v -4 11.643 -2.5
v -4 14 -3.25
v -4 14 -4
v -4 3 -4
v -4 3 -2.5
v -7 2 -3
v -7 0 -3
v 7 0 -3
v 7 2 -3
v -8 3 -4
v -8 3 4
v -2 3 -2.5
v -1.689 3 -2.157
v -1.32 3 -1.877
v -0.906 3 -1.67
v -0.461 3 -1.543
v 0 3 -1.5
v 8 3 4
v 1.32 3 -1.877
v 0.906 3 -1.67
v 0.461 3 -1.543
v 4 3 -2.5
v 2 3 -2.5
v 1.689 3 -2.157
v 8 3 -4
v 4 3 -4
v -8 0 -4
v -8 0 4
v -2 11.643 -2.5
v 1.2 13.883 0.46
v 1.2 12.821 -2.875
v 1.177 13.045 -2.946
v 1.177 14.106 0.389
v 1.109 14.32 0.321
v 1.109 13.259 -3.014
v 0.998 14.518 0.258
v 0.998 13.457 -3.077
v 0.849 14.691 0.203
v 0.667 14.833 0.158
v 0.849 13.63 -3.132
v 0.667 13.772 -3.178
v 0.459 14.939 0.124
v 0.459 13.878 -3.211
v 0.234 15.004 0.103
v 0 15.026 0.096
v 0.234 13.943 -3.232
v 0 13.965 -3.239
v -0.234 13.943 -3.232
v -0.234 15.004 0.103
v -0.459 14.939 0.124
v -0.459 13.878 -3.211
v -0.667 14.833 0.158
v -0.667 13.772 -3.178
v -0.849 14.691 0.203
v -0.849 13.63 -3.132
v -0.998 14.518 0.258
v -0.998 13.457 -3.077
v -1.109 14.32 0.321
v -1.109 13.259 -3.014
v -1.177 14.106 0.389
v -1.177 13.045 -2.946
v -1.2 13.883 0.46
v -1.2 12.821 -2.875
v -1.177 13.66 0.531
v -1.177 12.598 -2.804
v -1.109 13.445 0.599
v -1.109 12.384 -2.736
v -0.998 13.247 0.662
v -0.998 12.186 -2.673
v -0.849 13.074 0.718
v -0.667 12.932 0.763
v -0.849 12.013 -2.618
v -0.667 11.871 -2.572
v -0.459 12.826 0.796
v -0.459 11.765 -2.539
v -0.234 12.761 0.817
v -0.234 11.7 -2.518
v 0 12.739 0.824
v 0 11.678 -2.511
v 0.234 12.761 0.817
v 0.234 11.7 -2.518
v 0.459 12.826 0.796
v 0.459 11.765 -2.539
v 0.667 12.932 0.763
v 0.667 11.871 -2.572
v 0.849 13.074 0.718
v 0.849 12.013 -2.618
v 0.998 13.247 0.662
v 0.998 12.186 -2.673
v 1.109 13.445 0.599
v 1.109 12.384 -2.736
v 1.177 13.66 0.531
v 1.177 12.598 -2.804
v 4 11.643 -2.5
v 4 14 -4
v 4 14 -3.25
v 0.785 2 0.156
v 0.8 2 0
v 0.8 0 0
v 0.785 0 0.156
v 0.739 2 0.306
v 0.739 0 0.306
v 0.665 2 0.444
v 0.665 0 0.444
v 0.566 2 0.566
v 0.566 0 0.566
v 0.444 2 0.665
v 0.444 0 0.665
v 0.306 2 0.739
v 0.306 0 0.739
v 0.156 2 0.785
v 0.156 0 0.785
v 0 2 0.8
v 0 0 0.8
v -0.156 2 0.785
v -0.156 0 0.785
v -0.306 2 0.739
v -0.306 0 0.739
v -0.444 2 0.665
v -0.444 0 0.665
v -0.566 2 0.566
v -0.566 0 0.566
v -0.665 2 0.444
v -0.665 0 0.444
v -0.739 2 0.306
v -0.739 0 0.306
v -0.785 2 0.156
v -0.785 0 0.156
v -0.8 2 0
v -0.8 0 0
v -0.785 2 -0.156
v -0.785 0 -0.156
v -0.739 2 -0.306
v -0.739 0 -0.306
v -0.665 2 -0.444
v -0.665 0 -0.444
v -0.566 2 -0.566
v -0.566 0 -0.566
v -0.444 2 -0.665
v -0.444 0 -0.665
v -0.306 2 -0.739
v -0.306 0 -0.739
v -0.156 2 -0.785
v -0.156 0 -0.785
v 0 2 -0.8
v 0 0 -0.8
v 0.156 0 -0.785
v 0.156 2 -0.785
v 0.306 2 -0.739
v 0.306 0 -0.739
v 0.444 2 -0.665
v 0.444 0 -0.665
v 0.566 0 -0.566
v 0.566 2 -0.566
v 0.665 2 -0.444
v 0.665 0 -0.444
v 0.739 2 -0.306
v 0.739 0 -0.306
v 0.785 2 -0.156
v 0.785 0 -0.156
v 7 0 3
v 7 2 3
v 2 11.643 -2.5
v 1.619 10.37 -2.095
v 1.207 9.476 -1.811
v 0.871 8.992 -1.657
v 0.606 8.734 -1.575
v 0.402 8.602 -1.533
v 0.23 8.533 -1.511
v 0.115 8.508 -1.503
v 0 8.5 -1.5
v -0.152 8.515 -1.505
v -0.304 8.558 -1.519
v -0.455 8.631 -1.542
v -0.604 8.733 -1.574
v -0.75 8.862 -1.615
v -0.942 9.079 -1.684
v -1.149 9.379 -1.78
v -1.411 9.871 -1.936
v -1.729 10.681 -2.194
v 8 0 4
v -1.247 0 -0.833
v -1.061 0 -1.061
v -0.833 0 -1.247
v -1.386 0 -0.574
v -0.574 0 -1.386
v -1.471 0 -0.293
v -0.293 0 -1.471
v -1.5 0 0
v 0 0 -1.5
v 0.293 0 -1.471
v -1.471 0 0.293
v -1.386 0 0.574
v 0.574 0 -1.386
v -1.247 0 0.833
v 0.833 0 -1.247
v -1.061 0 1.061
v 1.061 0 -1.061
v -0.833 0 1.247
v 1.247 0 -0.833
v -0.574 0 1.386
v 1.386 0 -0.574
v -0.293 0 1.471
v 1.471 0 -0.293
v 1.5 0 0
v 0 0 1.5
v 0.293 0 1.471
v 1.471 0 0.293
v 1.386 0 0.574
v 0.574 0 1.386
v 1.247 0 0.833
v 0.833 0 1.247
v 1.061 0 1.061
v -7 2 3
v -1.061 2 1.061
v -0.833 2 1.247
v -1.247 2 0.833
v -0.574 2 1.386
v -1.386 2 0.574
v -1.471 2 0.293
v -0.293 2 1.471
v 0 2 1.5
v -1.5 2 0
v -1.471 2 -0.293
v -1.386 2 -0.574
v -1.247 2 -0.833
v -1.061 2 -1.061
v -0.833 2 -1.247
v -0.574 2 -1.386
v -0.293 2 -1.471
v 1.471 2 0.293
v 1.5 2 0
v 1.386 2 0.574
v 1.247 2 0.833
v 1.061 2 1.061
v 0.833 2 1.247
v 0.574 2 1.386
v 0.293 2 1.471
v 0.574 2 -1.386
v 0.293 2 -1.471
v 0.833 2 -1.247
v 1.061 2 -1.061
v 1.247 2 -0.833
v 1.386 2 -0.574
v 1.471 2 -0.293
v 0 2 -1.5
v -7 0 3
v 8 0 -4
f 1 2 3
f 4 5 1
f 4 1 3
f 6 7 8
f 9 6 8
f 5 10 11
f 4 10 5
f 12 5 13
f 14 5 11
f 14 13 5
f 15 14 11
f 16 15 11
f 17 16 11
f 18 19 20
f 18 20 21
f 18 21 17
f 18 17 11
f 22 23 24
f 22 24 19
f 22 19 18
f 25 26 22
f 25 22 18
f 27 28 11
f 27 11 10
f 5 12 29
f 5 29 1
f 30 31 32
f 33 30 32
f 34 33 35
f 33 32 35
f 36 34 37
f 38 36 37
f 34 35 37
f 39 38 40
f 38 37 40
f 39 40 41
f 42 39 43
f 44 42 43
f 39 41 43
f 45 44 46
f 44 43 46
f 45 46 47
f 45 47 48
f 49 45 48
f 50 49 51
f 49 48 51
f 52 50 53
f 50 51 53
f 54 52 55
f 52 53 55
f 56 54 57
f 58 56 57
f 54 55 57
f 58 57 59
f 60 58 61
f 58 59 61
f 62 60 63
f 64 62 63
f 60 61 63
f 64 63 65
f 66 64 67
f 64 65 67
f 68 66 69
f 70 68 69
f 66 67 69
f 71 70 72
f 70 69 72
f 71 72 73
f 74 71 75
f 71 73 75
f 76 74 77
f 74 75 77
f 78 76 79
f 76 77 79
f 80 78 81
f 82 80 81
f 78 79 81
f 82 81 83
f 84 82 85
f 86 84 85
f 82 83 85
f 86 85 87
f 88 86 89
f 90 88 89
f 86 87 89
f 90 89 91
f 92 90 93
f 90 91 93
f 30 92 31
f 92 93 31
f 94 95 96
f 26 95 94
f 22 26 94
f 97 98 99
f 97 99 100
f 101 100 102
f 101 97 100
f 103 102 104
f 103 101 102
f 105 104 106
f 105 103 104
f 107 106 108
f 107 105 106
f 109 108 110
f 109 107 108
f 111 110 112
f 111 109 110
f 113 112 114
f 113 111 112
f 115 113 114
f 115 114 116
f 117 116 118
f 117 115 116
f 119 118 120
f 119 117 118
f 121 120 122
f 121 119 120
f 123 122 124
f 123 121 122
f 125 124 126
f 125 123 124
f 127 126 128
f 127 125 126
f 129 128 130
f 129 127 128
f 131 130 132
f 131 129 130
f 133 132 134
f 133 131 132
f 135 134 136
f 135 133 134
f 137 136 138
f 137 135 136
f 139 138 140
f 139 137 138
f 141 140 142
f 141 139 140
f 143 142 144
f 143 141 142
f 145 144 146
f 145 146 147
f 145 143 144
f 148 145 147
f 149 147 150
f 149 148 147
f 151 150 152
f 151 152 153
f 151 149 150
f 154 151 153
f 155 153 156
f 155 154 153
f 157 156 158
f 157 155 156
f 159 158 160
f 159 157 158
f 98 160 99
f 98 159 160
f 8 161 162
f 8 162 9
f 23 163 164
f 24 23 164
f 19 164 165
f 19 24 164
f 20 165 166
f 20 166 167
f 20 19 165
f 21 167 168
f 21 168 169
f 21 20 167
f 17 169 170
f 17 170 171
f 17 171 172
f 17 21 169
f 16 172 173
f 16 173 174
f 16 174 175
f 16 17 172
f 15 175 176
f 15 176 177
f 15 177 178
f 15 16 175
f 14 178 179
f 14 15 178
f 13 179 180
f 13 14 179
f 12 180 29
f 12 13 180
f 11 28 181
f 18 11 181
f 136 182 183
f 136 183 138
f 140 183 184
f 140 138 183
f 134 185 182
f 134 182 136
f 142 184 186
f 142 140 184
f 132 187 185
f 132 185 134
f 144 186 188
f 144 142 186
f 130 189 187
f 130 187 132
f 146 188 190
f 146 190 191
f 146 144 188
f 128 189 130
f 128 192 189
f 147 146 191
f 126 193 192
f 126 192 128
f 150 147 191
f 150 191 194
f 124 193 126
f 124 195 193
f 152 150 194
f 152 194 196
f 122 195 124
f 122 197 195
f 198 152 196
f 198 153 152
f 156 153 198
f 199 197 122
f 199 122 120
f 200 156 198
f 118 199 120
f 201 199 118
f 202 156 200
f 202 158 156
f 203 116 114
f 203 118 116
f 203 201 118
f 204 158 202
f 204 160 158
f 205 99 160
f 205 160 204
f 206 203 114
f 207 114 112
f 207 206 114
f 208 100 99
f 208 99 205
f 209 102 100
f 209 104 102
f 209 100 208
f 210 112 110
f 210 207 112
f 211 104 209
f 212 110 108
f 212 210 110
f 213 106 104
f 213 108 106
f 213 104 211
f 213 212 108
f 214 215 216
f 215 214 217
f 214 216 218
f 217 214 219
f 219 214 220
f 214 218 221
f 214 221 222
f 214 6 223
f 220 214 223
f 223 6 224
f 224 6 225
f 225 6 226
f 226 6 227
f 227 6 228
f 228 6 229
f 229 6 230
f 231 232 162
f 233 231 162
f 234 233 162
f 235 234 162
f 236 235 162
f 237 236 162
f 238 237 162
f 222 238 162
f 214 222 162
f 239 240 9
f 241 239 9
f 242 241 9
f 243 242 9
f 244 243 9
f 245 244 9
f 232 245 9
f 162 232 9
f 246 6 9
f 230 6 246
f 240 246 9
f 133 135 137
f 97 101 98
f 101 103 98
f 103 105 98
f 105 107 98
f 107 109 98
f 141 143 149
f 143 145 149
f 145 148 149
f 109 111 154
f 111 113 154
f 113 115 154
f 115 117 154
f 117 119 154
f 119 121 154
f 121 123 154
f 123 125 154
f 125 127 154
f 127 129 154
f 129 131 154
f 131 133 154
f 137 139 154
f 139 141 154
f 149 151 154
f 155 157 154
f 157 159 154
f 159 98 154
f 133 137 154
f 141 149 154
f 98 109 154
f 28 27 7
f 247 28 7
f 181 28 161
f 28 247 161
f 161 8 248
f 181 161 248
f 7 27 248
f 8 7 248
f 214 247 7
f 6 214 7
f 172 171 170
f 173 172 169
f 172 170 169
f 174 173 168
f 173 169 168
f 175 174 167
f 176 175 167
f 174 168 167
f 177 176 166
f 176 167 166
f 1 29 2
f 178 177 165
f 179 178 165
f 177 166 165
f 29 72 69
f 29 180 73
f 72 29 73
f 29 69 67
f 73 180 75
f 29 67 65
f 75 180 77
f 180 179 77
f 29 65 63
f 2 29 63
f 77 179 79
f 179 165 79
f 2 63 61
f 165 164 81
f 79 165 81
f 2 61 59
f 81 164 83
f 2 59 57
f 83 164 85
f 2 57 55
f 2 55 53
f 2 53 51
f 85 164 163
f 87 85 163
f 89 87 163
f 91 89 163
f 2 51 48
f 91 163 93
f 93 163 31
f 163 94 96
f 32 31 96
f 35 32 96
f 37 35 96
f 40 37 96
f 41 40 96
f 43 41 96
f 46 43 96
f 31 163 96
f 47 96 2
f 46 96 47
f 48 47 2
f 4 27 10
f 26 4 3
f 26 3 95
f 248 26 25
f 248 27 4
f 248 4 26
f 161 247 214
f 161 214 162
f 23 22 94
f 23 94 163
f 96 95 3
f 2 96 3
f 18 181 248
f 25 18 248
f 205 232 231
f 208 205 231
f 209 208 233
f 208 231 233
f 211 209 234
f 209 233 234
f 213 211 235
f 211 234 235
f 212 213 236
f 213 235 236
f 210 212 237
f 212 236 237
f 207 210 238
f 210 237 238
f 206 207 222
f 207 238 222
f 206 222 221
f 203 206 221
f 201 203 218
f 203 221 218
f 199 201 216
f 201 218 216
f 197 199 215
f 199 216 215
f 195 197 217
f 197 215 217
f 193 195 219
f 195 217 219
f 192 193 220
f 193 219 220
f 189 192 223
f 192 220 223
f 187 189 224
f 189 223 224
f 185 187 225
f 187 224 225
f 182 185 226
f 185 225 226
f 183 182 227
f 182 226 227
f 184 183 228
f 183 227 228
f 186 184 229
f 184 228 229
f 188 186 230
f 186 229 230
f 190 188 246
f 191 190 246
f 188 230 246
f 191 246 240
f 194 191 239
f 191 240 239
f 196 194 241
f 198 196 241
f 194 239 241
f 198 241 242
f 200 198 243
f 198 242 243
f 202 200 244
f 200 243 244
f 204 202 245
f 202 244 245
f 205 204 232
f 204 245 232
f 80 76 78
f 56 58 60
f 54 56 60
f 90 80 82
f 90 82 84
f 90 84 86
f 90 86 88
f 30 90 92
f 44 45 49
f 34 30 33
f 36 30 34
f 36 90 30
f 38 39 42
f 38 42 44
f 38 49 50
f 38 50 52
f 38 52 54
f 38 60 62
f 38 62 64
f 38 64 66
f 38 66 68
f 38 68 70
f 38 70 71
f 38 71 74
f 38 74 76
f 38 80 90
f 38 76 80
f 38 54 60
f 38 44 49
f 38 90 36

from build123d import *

# Parameters (mm, degrees)
SKETCH1_W           = 16
SKETCH1_H           = 8
BOSS_EXTRUDE1_DEPTH = 3
SHELL1_T            = -1
SKETCH2_R           = 1.5
SKETCH2_R_2         = 0.8
BOSS_EXTRUDE2_DEPTH = 2
BOSS_EXTRUDE3_DEPTH = 11
CUT_EXTRUDE2_DEPTH  = 13
SKETCH6_R           = 1.2
BOSS_EXTRUDE4_DEPTH = 3.5


with BuildPart() as part:
    # Sketch1 → Boss-Extrude1 (new body)
    with BuildSketch(Plane(origin=(0, 0, 0), x_dir=(1, 0, 0), z_dir=(0, 1, 0))):
        Rectangle(SKETCH1_W, SKETCH1_H)
    extrude(amount=BOSS_EXTRUDE1_DEPTH)

    # Shell1
    shell1_openings = [part.faces().sort_by_distance(p)[0] for p in [
        (0, 0, 0),
    ]]
    offset(amount=SHELL1_T, openings=shell1_openings, kind=Kind.INTERSECTION)

    # Sketch2 → Boss-Extrude2 (add)
    with BuildSketch(Plane.XZ.offset(-2)):
        Circle(SKETCH2_R)
        Circle(SKETCH2_R_2, mode=Mode.SUBTRACT)
    extrude(amount=BOSS_EXTRUDE2_DEPTH)

    # Sketch3 → Boss-Extrude3 (add)
    with BuildSketch(Plane(origin=(0, 3, 0), x_dir=(1, 0, 0), z_dir=(0, 1, 0))):
        with BuildLine():
            Line((-4, 4), (4, 4))
            Line((4, 4), (4, 2.5))
            Line((4, 2.5), (2, 2.5))
            ThreePointArc((2, 2.5), (0, 1.5), (-2, 2.5))
            Line((-2, 2.5), (-4, 2.5))
            Line((-4, 2.5), (-4, 4))
        make_face()
    extrude(amount=BOSS_EXTRUDE3_DEPTH)

    # Sketch5 → Cut-Extrude2 (cut, through all)
    with BuildSketch(Plane(origin=(4, 0, 0), x_dir=(0, 0, -1), z_dir=(1, 0, 0))):
        Polygon((3.25, 14), (1.5, 14), (1.5, 8.5), align=None)
    extrude(amount=-CUT_EXTRUDE2_DEPTH, mode=Mode.SUBTRACT)

    # Sketch6 → Boss-Extrude4 (add)
    with BuildSketch(Plane(origin=(0, 0.348030019, 1.09380863), x_dir=(1, 0, 0), z_dir=(0, 0.303203657, 0.95292578))):
        with Locations((0, 13.089580337)):
            Circle(SKETCH6_R)
    extrude(amount=BOSS_EXTRUDE4_DEPTH)


solid = part.part
